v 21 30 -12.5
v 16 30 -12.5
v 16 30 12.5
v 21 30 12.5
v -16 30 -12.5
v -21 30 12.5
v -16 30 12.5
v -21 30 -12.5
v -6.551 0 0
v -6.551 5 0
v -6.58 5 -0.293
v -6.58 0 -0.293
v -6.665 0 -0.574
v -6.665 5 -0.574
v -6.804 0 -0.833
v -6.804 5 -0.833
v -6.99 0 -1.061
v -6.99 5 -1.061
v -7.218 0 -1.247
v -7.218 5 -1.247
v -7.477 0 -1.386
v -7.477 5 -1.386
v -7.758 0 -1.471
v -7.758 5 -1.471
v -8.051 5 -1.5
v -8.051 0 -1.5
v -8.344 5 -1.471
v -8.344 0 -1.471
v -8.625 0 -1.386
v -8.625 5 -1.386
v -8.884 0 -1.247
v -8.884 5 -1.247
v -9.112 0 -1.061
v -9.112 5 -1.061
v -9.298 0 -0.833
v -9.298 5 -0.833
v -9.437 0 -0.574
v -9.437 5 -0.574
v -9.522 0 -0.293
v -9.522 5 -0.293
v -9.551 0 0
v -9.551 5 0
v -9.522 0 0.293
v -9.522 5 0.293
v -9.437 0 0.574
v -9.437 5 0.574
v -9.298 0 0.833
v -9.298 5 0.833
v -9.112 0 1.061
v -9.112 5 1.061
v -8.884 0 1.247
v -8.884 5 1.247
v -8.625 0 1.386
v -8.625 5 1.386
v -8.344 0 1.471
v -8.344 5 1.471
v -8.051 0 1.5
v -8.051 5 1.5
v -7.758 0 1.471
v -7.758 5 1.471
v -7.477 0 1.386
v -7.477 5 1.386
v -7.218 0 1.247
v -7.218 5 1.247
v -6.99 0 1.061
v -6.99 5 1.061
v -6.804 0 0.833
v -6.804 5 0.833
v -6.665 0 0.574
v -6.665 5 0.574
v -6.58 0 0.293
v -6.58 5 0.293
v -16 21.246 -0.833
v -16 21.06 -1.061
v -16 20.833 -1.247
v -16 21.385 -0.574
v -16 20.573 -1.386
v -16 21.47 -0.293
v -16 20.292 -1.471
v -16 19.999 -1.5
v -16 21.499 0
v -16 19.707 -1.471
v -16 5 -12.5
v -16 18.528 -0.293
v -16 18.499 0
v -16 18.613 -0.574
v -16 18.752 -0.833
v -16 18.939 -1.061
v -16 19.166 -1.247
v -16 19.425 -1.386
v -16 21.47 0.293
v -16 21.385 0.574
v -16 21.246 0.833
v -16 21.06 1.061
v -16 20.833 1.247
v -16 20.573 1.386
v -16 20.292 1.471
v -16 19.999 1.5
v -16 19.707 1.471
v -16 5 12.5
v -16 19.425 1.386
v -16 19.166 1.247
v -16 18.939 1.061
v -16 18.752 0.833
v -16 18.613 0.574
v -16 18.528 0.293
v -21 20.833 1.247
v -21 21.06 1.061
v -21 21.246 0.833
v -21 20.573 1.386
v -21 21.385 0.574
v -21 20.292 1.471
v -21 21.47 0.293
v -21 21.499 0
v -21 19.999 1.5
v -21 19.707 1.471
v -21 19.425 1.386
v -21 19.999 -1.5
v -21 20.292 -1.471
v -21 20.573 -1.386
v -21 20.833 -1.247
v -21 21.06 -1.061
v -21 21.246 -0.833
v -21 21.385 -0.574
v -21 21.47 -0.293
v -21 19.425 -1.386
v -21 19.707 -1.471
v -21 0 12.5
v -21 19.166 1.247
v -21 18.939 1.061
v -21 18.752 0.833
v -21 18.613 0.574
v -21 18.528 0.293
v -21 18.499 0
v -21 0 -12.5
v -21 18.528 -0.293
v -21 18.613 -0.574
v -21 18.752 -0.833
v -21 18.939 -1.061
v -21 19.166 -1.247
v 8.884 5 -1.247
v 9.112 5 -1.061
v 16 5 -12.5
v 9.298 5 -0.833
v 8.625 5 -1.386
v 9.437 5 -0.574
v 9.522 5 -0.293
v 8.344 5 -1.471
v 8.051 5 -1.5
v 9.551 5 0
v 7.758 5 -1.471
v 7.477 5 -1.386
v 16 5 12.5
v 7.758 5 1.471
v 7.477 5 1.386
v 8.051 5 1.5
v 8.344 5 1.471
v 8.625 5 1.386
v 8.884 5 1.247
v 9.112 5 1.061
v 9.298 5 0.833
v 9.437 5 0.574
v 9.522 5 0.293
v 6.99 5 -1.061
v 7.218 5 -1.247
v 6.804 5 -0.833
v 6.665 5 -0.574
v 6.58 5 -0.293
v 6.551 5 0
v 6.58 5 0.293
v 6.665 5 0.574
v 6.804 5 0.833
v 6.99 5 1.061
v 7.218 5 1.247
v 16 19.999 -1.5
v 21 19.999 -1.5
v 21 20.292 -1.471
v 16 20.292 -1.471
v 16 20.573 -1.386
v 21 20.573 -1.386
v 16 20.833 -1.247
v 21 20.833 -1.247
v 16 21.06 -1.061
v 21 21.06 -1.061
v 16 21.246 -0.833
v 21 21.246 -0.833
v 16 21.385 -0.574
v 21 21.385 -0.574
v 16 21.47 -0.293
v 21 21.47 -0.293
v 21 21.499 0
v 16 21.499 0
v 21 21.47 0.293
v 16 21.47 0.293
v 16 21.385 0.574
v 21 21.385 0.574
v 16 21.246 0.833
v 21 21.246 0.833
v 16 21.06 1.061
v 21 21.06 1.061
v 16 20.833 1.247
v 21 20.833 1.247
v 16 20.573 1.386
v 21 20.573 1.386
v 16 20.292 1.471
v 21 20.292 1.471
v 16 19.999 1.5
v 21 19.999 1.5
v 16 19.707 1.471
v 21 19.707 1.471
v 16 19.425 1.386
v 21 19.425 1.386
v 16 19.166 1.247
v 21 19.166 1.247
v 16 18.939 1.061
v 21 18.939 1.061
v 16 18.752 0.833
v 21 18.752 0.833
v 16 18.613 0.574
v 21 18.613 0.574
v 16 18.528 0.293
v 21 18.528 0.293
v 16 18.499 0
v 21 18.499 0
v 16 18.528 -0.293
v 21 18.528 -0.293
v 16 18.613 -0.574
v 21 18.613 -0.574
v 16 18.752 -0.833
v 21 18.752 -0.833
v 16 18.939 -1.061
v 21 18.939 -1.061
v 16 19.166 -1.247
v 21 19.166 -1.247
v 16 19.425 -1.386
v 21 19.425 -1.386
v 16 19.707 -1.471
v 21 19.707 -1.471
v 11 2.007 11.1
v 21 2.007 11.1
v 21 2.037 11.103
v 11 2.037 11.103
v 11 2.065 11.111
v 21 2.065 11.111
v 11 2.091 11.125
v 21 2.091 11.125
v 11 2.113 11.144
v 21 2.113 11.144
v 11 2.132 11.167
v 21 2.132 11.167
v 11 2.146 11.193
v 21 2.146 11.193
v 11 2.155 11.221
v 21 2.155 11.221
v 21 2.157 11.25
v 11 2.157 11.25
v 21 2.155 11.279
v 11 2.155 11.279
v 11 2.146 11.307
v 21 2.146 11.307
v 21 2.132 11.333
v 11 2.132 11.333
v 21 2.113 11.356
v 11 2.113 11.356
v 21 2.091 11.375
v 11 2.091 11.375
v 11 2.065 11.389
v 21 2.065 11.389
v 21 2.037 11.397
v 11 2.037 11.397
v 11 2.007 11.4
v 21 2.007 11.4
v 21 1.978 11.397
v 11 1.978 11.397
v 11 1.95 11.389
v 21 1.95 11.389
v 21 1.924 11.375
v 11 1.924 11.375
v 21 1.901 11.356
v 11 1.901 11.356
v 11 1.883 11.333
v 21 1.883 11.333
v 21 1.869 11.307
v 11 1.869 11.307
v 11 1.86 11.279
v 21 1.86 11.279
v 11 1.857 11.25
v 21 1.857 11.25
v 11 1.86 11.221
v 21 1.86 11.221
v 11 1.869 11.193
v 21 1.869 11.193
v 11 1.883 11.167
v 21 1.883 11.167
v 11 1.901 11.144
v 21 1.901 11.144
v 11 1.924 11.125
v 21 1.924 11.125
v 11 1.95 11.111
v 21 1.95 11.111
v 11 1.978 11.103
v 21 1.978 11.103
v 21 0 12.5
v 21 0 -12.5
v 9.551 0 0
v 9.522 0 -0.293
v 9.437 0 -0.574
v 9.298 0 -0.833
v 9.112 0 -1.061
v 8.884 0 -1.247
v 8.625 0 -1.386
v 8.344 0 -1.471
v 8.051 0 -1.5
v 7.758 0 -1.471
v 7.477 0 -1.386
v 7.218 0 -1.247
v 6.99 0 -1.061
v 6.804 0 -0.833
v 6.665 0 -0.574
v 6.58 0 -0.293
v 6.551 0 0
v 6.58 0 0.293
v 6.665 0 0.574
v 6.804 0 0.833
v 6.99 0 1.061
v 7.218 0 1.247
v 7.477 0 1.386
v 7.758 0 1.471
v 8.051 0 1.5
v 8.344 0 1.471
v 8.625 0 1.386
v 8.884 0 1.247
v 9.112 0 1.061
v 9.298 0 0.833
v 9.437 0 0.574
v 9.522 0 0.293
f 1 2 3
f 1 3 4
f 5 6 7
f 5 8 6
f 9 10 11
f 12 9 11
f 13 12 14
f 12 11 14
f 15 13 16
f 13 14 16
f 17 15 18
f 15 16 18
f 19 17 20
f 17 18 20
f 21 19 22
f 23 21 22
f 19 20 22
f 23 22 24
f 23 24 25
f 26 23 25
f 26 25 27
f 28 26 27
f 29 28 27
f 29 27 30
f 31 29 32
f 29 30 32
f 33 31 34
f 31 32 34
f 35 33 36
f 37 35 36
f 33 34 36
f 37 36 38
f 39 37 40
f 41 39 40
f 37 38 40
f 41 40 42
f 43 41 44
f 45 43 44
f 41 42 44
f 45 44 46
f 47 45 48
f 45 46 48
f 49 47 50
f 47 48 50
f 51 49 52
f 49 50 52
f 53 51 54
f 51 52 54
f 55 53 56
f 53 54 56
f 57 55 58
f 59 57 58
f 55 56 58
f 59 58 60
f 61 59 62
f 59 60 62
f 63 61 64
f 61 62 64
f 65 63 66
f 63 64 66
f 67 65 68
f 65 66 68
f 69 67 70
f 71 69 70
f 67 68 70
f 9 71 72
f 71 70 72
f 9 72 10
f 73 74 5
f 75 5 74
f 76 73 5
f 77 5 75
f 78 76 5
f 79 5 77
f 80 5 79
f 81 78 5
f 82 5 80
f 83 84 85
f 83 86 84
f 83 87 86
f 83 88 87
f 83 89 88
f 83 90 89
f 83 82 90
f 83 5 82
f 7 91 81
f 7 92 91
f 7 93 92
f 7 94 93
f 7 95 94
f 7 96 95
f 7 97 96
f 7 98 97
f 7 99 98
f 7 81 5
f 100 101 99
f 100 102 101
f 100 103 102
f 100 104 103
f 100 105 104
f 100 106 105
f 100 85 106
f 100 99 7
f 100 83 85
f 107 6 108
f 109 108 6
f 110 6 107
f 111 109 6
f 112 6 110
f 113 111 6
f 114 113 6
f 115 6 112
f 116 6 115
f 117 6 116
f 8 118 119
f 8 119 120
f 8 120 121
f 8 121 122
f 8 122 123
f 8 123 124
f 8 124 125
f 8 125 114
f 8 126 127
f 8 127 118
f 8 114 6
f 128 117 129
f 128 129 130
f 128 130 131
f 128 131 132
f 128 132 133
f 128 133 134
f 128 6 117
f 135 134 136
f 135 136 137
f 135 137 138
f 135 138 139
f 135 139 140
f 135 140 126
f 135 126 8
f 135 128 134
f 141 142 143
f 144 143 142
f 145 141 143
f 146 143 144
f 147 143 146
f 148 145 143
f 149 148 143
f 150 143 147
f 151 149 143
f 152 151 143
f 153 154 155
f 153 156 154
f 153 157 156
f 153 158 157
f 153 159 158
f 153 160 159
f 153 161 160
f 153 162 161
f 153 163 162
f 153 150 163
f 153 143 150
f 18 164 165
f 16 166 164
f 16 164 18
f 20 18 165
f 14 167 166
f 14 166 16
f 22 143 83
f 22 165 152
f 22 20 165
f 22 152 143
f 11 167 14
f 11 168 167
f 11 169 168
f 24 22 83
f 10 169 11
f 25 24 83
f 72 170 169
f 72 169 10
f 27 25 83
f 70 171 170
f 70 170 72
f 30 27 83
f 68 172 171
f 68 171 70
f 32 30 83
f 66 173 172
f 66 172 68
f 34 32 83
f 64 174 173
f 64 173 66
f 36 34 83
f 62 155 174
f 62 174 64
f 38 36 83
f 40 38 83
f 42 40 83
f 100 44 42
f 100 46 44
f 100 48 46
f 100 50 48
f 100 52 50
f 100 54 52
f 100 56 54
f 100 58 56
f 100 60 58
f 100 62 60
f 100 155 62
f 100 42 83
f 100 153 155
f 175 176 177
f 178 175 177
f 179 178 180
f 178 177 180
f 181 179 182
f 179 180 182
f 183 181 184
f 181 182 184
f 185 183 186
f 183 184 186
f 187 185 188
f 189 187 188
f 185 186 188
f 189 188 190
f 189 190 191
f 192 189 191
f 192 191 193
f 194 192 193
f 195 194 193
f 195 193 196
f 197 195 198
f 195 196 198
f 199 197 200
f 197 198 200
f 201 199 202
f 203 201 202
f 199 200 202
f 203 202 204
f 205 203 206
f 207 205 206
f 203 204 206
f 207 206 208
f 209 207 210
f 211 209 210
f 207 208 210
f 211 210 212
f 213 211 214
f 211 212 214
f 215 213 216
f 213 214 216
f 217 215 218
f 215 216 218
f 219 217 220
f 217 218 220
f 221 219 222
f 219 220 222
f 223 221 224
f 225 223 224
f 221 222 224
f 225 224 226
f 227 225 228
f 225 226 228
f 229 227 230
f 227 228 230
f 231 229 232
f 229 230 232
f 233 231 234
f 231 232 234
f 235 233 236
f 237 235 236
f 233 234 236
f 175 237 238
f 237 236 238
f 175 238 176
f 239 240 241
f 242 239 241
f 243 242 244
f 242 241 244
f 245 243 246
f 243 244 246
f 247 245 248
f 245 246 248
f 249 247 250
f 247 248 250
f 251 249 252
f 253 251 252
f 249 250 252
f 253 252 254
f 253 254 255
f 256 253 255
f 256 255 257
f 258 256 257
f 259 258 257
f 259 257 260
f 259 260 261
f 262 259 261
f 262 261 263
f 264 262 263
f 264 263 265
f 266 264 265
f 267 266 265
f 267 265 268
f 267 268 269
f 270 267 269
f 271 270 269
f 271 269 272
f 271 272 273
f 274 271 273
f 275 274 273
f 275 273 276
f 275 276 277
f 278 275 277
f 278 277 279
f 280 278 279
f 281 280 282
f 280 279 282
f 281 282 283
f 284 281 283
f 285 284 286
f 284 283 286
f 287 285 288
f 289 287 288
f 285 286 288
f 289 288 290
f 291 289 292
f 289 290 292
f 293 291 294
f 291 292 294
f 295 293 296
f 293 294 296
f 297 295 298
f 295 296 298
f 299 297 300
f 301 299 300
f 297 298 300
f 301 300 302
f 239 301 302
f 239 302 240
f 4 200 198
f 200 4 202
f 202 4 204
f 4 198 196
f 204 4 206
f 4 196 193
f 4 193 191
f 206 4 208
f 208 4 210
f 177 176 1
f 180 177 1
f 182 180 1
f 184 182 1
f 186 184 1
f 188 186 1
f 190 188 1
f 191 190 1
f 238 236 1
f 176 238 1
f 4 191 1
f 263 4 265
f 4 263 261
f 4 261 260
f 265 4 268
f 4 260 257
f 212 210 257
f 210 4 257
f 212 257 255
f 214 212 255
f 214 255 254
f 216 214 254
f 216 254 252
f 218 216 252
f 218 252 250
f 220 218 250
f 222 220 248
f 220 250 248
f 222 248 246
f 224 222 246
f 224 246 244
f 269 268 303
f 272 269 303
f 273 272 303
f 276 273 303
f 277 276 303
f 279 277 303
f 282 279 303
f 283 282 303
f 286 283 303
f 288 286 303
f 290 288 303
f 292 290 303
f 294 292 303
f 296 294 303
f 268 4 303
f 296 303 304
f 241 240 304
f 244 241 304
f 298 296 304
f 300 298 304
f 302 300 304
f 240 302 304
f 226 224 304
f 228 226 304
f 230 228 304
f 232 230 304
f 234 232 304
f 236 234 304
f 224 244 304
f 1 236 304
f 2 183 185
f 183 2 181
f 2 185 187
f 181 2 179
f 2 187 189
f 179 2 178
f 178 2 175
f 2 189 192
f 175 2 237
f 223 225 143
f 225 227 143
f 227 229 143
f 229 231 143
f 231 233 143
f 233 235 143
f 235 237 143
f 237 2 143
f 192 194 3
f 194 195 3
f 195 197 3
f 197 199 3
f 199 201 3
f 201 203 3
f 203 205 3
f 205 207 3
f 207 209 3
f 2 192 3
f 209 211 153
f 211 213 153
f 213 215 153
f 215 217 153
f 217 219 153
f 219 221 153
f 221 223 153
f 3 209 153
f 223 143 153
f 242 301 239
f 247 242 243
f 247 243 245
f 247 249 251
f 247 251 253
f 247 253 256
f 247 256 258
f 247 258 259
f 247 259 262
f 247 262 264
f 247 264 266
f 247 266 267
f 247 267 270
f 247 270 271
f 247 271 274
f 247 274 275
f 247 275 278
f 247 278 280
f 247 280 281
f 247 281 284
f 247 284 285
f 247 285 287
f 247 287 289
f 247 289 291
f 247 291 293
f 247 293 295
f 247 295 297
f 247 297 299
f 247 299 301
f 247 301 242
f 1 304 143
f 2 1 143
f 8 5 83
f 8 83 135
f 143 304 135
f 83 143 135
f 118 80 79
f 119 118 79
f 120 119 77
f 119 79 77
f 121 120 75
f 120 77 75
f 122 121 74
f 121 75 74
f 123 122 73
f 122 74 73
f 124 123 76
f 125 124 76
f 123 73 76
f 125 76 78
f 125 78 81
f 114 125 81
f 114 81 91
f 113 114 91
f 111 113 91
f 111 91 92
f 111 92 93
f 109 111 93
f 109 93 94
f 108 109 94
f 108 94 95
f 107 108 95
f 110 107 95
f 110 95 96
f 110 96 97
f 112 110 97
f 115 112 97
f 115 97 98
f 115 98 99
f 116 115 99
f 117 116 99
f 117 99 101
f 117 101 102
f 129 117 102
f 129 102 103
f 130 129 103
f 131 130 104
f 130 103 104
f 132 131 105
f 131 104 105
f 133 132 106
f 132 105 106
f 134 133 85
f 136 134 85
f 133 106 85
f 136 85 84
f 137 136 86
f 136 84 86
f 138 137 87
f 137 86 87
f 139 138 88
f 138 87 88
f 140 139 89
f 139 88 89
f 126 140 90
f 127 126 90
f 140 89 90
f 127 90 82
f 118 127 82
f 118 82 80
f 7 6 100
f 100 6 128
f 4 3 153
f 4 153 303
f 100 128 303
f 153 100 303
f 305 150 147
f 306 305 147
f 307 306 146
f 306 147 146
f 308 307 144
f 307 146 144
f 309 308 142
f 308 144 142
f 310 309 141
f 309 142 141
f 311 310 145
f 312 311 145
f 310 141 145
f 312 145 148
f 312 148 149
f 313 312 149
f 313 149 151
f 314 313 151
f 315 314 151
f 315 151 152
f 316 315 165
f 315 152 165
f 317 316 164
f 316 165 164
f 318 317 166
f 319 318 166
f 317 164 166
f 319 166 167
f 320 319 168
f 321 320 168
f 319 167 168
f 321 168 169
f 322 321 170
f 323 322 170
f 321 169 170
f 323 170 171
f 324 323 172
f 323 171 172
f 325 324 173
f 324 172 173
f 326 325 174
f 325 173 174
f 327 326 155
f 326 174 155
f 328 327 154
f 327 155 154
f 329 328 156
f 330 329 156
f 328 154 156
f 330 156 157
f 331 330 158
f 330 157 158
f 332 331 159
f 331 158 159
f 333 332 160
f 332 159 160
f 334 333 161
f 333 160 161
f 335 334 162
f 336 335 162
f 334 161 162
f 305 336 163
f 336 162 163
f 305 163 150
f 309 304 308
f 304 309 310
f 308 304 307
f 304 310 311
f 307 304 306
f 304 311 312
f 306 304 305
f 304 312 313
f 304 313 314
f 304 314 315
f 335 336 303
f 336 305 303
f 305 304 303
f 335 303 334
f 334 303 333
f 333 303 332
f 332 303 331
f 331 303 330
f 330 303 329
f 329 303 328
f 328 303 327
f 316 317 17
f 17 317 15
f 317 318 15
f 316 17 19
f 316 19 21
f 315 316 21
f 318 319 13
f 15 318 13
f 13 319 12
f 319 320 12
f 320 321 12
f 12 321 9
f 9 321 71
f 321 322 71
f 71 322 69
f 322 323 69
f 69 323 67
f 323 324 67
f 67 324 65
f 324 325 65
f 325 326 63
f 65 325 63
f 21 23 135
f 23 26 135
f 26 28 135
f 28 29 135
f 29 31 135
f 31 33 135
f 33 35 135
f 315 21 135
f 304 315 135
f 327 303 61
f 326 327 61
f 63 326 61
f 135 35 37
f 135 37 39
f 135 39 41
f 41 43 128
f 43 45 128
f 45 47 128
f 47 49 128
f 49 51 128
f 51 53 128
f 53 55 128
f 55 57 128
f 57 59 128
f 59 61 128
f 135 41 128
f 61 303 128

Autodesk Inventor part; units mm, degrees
ref_plane "YZ Plane" through (0, 0, 0) normal (1, 0, 0) x (0, 1, 0)
ref_plane "XZ Plane" through (0, 0, 0) normal (0, 1, 0) x (-1, 0, 0)
ref_plane "XY Plane" through (0, 0, 0) normal (0, 0, 1) x (1, 0, 0)
sketch "Sketch1" plane through (0, 0, 0) normal (0, 1, 0) x (-1, 0, 0)
  line L0 (21, 12.5) -> (-21, 12.5)
  line L1 (-21, 12.5) -> (-21, -12.5)
  line L2 (-21, -12.5) -> (21, -12.5)
  line L3 (21, -12.5) -> (21, 12.5)
  line L4 (21, 12.5) -> (-21, -12.5) construction
  line L5 (-21, 12.5) -> (21, -12.5) construction
  point P0 (0, 0)
  dimension "d0" = 42
  dimension "d1" = 25
extrude "Extrusion1" add sketch "Sketch1" along normal blind 5
sketch "Sketch5" plane through (-21, 0, -12.5) normal (-1, 0, 0) x (0, 0, 1)
  point P0 (12.5, 0)
sketch "Sketch6" plane through (21, 0, 12.5) normal (1, 0, 0) x (0, 0, -1)
  circle A0 centre (1.25, 2.0074) radius 0.15
  point P0 (12.5, 0)
  dimension "d11" = 0.3
extrude "Extrusion5" cut sketch "Sketch6" against normal blind 10
sketch "Sketch8" plane through (0, 5, 0) normal (0, 1, 0) x (1, 0, 0)
  line L0 (21, 12.5) -> (-21, 12.5) projected
  line L1 (-21, -12.5) -> (21, -12.5) projected
  line L2 (-21, 12.5) -> (-16, 12.5)
  line L3 (-16, 12.5) -> (-16, -12.5)
  line L4 (-16, -12.5) -> (-21, -12.5)
  line L5 (-21, -12.5) -> (-21, 12.5)
  point P0 (0, 0)
  dimension "d14" = 5
extrude "Extrusion6" add sketch "Sketch8" along normal blind 25
sketch "Sketch9" plane through (0, 5, 0) normal (0, 1, 0) x (1, 0, 0)
  line L0 (21, 12.5) -> (-21, 12.5) projected
  line L1 (-21, -12.5) -> (21, -12.5) projected
  line L2 (21, 12.5) -> (16, 12.5)
  line L3 (16, 12.5) -> (16, -12.5)
  line L4 (16, -12.5) -> (21, -12.5)
  line L5 (21, -12.5) -> (21, 12.5)
  point P0 (0, 0)
  point P1 (16, 12.5)
  dimension "d17" = 5
extrude "Extrusion7" add sketch "Sketch9" along normal blind 25
sketch "Sketch10" plane through (21, 0, 12.5) normal (1, 0, 0) x (0, 0, -1)
  circle A0 centre (12.5, 19.9992) radius 1.5
  point P0 (12.5, 0)
  dimension "d20" = 3
extrude "Extrusion8" cut sketch "Sketch10" against normal blind 100
sketch "Sketch11" plane through (0, 5, 0) normal (0, 1, 0) x (1, 0, 0)
  point P0 (0, 0)
sketch "Sketch12" plane through (0, 5, 0) normal (0, 1, 0) x (1, 0, 0)
  circle A0 centre (-8.051, 0) radius 1.5
  circle A1 centre (8.051, 0) radius 1.5
  point P0 (0, 0)
  dimension "d23" = 3
  dimension "d24" = 3
extrude "Extrusion9" cut sketch "Sketch12" against normal blind 10
properties part number "clamp"
